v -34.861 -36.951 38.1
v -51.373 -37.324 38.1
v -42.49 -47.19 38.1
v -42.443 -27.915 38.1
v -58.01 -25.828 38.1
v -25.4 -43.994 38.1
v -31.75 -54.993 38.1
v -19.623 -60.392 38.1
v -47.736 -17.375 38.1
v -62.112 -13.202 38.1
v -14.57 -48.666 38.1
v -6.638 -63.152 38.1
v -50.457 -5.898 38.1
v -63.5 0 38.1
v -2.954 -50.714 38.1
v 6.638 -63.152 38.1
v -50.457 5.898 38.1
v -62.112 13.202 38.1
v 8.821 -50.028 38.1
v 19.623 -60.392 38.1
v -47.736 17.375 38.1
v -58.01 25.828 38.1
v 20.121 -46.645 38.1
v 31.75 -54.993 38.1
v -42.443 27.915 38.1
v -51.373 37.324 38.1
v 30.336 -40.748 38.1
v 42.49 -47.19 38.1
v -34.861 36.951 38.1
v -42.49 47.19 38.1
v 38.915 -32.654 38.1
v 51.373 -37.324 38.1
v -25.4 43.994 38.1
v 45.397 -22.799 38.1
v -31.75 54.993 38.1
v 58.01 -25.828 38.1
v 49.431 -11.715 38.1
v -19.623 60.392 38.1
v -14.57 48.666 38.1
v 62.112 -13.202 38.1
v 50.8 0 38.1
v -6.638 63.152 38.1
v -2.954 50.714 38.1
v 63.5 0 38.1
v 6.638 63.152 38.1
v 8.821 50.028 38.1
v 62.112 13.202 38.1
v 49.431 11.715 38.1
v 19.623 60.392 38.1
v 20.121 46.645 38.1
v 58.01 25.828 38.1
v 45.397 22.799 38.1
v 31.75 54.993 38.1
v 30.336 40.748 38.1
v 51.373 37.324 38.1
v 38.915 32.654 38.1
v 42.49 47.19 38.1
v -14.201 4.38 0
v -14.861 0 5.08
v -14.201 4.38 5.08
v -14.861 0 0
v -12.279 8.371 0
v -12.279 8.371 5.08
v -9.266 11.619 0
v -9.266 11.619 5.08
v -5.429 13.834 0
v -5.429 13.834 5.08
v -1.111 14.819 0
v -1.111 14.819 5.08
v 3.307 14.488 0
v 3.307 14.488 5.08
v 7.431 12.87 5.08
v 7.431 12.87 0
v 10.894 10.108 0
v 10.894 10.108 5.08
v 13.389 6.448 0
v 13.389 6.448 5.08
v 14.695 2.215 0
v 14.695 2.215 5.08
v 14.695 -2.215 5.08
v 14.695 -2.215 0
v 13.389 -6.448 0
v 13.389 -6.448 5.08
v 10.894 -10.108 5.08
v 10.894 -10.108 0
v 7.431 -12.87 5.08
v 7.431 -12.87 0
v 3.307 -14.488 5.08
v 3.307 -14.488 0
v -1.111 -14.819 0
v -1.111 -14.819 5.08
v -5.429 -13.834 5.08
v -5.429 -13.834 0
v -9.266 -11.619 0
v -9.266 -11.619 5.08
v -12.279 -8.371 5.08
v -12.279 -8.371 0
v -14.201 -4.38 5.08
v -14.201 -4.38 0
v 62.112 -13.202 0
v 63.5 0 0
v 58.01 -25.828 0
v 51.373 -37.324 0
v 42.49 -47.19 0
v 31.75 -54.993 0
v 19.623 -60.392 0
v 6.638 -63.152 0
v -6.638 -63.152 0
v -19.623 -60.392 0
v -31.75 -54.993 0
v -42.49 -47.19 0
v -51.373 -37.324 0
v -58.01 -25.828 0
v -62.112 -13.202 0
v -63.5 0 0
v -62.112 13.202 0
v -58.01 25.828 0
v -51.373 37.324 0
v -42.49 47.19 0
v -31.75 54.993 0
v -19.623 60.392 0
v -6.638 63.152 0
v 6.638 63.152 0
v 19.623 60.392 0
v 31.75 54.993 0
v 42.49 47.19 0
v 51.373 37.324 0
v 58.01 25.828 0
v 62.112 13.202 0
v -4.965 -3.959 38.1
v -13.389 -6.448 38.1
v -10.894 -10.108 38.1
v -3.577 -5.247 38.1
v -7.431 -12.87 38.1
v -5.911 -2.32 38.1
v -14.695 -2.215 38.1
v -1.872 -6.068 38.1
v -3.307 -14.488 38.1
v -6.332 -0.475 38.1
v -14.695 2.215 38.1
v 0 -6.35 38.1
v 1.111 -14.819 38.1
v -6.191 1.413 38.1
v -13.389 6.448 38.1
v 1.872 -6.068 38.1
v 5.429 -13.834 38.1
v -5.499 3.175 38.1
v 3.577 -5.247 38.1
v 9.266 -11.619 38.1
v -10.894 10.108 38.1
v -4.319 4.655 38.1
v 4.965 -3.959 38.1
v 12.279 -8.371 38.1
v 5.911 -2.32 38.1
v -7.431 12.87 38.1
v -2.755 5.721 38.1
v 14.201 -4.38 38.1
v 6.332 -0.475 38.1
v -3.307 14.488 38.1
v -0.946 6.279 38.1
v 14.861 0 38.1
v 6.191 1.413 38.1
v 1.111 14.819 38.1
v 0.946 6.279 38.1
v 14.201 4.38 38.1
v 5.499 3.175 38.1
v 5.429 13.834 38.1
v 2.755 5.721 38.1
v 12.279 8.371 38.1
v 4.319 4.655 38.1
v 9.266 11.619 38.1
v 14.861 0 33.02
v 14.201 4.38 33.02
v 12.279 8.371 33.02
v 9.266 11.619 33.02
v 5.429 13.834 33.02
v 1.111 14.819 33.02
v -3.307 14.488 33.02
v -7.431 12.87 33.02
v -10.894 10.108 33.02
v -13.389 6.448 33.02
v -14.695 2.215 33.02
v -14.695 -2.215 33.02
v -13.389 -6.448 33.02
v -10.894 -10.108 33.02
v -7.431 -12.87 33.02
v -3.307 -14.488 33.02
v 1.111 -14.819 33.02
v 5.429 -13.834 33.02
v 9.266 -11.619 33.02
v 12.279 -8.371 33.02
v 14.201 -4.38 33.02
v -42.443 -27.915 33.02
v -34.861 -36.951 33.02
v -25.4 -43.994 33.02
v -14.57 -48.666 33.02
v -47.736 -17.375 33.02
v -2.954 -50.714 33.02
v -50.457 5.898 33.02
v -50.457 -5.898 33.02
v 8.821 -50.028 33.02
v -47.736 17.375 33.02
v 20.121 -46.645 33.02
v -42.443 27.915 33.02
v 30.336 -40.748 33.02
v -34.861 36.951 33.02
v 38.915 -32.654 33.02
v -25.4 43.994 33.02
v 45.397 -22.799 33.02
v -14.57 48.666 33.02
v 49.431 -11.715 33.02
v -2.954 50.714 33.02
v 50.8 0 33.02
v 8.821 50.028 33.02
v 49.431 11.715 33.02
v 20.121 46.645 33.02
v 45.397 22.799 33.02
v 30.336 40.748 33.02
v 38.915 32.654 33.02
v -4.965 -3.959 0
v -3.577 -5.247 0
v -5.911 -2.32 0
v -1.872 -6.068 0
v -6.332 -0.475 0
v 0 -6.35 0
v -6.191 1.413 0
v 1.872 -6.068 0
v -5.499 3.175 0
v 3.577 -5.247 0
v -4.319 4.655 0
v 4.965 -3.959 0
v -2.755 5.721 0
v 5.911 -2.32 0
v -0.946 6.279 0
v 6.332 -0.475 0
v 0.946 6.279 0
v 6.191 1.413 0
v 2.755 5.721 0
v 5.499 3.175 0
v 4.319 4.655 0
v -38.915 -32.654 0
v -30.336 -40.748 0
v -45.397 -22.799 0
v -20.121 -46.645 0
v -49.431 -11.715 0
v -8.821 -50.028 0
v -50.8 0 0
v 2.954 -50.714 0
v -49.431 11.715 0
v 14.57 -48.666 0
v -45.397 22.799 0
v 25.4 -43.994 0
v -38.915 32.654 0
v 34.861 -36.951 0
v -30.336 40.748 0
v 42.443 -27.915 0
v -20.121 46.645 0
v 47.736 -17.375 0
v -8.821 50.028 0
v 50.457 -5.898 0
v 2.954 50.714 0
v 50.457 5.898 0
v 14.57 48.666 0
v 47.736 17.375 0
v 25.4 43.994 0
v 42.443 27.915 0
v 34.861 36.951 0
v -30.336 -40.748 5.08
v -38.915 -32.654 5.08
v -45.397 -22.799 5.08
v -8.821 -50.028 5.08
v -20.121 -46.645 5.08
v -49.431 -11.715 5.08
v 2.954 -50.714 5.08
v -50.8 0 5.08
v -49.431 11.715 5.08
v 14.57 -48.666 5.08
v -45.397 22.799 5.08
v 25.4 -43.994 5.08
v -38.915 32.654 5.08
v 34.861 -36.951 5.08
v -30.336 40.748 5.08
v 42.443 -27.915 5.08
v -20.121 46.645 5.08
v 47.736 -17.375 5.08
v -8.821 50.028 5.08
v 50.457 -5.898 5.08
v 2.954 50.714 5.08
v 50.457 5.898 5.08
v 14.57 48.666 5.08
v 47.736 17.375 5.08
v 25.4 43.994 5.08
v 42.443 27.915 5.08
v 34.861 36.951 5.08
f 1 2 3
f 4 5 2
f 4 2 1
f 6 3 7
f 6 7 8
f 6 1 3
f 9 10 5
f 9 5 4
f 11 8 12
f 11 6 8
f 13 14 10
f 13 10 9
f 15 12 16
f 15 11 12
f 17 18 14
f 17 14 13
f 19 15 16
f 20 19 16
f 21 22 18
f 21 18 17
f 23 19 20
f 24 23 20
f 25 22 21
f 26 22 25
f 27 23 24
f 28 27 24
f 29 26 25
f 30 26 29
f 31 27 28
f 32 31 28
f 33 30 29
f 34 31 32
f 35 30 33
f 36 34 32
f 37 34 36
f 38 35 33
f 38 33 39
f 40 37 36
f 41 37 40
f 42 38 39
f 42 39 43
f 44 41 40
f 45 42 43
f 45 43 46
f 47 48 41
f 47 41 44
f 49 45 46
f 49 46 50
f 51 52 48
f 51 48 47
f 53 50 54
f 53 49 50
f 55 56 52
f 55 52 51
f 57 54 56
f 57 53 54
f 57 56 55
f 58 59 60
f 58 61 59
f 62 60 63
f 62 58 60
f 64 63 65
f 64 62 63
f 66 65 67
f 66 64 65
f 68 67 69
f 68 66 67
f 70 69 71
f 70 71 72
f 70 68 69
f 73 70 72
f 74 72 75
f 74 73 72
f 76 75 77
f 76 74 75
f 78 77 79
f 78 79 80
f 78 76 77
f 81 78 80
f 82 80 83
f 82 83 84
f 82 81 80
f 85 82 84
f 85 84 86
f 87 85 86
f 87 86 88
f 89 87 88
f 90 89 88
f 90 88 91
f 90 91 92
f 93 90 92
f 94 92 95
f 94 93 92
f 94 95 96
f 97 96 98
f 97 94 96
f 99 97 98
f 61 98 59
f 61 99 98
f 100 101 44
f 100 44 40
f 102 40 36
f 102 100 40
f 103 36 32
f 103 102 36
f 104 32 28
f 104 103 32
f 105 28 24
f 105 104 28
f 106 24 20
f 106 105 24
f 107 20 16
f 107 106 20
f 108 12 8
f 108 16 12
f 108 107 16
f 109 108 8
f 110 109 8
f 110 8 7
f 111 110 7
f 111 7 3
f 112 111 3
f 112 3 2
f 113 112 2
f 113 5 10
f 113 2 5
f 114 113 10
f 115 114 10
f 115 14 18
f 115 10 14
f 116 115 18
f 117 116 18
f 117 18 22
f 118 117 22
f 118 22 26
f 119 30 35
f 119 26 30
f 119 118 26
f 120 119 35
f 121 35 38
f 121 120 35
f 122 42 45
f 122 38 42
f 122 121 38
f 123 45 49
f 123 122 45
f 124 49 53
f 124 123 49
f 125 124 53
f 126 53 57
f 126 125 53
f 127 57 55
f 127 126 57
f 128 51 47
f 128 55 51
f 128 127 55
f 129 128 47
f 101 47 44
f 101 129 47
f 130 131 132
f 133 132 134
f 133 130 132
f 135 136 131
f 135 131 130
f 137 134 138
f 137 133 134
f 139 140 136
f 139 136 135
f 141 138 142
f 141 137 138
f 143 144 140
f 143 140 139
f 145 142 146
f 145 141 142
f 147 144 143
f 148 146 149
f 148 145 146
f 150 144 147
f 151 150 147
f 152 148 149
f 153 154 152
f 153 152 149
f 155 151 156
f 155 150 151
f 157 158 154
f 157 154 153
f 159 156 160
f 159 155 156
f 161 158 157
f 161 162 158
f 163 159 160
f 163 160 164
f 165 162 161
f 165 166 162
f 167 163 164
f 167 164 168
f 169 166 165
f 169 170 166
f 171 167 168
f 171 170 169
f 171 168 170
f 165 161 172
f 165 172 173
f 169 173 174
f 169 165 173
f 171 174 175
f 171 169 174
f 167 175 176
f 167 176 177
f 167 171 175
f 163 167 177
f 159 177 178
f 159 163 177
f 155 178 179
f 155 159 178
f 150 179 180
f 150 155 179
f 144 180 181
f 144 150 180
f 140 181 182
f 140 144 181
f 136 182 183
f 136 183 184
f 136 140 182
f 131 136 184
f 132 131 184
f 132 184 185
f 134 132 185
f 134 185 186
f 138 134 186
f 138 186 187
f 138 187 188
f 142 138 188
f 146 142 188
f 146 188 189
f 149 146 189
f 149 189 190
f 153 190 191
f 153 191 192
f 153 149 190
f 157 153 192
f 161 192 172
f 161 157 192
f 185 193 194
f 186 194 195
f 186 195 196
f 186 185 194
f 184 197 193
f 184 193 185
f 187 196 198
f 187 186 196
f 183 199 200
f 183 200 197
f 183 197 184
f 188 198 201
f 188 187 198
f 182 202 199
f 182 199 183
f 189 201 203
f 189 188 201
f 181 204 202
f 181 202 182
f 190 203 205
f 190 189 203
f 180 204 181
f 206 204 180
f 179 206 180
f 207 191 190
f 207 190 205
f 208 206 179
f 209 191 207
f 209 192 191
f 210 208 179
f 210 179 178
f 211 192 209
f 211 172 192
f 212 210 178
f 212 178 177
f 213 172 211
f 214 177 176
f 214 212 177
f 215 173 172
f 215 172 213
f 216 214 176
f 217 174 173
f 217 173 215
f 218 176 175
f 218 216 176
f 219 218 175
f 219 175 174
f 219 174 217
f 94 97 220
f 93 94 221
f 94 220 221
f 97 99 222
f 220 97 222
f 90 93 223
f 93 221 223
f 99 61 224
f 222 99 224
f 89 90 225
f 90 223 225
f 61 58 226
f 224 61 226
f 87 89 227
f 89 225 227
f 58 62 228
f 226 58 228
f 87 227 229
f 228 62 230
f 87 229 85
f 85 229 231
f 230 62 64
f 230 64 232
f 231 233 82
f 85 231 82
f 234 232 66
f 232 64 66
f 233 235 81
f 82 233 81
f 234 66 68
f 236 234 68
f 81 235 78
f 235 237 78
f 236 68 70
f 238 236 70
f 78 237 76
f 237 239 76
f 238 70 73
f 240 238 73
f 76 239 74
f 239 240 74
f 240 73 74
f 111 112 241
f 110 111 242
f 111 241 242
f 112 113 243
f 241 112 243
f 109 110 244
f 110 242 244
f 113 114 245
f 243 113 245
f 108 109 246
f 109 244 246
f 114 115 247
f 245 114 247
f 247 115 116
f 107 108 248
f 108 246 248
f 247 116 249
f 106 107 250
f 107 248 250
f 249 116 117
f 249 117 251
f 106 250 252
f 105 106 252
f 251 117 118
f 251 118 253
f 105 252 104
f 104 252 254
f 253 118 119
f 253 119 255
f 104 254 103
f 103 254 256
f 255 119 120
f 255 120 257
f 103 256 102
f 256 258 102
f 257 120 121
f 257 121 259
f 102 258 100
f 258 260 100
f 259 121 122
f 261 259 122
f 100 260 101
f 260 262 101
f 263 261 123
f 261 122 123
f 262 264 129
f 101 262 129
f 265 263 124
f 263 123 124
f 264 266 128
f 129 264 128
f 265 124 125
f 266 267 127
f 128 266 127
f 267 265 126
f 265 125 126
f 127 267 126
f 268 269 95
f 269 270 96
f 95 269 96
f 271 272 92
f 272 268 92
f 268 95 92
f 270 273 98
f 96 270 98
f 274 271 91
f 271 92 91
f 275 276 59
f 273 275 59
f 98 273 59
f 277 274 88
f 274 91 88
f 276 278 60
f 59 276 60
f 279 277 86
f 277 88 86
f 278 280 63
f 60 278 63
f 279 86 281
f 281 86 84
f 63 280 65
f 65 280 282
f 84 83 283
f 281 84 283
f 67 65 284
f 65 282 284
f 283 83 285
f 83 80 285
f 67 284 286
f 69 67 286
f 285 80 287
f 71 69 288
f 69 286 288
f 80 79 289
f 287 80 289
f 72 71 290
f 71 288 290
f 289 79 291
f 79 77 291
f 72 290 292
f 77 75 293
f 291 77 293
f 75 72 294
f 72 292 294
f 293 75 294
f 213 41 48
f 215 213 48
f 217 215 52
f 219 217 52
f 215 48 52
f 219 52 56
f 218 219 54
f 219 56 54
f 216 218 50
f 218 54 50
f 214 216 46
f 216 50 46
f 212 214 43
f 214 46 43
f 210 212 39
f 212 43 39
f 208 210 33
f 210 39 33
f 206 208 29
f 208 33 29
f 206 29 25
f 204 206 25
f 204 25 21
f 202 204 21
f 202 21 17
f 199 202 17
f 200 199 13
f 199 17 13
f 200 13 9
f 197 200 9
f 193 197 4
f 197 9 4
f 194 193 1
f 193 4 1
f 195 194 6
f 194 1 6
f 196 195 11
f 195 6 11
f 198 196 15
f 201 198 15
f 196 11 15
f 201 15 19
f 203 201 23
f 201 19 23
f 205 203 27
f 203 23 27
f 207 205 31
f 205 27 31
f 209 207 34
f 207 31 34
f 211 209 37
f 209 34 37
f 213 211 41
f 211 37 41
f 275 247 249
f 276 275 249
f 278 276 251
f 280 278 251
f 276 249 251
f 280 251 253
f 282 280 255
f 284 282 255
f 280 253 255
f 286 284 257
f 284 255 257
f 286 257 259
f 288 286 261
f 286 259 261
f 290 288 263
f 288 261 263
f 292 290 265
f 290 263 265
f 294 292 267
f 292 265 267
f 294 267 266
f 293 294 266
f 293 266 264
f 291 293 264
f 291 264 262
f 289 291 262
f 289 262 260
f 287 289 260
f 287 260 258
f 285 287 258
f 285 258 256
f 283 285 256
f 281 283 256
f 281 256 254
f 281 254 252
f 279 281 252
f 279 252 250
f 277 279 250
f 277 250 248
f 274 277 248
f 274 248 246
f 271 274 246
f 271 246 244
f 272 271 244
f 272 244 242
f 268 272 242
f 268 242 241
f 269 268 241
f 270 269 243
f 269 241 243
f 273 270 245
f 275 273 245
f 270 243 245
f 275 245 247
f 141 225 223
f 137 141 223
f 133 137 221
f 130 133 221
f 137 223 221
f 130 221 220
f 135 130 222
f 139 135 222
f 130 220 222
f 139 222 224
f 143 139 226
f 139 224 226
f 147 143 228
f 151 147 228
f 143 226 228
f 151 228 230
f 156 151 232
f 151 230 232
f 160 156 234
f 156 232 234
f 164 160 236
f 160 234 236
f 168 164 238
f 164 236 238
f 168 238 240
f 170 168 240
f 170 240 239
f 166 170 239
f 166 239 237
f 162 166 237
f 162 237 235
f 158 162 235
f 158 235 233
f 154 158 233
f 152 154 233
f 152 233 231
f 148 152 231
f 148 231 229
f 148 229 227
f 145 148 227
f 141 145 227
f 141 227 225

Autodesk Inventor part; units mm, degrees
ref_plane "YZ Plane" through (0, 0, 0) normal (1, 0, 0) x (0, 1, 0)
ref_plane "XZ Plane" through (0, 0, 0) normal (0, 1, 0) x (-1, 0, 0)
ref_plane "XY Plane" through (0, 0, 0) normal (0, 0, 1) x (1, 0, 0)
sketch "Sketch3" plane through (0, 0, 0) normal (0, 0, 1) x (1, 0, 0)
  circle A0 centre (0, 0) radius 63.5
  dimension "d1" = 127
extrude "Extrusion1" add sketch "Sketch3" along normal blind 38.1
sketch "Sketch4" plane through (0, 0, 38.1) normal (0, 0, 1) x (1, 0, 0)
  circle A0 centre (0, 0) radius 6.35
  dimension "d4" = 12.7
hole "Hole1" at (0, 0, 38.1) direction (0, 0, -1) diameter 12.7 end through all
sketch "Sketch5" plane through (0, 0, 38.1) normal (0, 0, 1) x (1, 0, 0)
  circle A0 centre (0, 0) radius 50.8
  circle A1 centre (0, 0) radius 14.861
  dimension "d12" = 101.6
  dimension "d13" = 29.722
emboss "Emboss1" sketch "Sketch5" operation cut depth 5.08 direction (0, 0, -1)
sketch "Sketch6" plane through (0, 0, 0) normal (0, 0, -1) x (-1, 0, 0)
  circle A0 centre (0, 0) radius 50.8
  circle A1 centre (0, 0) radius 14.861
  dimension "d16" = 101.6
  dimension "d17" = 29.722
emboss "Emboss2" sketch "Sketch6" operation cut depth 5.08 direction (0, 0, 1)
properties part number "SubWheelWithHole"
